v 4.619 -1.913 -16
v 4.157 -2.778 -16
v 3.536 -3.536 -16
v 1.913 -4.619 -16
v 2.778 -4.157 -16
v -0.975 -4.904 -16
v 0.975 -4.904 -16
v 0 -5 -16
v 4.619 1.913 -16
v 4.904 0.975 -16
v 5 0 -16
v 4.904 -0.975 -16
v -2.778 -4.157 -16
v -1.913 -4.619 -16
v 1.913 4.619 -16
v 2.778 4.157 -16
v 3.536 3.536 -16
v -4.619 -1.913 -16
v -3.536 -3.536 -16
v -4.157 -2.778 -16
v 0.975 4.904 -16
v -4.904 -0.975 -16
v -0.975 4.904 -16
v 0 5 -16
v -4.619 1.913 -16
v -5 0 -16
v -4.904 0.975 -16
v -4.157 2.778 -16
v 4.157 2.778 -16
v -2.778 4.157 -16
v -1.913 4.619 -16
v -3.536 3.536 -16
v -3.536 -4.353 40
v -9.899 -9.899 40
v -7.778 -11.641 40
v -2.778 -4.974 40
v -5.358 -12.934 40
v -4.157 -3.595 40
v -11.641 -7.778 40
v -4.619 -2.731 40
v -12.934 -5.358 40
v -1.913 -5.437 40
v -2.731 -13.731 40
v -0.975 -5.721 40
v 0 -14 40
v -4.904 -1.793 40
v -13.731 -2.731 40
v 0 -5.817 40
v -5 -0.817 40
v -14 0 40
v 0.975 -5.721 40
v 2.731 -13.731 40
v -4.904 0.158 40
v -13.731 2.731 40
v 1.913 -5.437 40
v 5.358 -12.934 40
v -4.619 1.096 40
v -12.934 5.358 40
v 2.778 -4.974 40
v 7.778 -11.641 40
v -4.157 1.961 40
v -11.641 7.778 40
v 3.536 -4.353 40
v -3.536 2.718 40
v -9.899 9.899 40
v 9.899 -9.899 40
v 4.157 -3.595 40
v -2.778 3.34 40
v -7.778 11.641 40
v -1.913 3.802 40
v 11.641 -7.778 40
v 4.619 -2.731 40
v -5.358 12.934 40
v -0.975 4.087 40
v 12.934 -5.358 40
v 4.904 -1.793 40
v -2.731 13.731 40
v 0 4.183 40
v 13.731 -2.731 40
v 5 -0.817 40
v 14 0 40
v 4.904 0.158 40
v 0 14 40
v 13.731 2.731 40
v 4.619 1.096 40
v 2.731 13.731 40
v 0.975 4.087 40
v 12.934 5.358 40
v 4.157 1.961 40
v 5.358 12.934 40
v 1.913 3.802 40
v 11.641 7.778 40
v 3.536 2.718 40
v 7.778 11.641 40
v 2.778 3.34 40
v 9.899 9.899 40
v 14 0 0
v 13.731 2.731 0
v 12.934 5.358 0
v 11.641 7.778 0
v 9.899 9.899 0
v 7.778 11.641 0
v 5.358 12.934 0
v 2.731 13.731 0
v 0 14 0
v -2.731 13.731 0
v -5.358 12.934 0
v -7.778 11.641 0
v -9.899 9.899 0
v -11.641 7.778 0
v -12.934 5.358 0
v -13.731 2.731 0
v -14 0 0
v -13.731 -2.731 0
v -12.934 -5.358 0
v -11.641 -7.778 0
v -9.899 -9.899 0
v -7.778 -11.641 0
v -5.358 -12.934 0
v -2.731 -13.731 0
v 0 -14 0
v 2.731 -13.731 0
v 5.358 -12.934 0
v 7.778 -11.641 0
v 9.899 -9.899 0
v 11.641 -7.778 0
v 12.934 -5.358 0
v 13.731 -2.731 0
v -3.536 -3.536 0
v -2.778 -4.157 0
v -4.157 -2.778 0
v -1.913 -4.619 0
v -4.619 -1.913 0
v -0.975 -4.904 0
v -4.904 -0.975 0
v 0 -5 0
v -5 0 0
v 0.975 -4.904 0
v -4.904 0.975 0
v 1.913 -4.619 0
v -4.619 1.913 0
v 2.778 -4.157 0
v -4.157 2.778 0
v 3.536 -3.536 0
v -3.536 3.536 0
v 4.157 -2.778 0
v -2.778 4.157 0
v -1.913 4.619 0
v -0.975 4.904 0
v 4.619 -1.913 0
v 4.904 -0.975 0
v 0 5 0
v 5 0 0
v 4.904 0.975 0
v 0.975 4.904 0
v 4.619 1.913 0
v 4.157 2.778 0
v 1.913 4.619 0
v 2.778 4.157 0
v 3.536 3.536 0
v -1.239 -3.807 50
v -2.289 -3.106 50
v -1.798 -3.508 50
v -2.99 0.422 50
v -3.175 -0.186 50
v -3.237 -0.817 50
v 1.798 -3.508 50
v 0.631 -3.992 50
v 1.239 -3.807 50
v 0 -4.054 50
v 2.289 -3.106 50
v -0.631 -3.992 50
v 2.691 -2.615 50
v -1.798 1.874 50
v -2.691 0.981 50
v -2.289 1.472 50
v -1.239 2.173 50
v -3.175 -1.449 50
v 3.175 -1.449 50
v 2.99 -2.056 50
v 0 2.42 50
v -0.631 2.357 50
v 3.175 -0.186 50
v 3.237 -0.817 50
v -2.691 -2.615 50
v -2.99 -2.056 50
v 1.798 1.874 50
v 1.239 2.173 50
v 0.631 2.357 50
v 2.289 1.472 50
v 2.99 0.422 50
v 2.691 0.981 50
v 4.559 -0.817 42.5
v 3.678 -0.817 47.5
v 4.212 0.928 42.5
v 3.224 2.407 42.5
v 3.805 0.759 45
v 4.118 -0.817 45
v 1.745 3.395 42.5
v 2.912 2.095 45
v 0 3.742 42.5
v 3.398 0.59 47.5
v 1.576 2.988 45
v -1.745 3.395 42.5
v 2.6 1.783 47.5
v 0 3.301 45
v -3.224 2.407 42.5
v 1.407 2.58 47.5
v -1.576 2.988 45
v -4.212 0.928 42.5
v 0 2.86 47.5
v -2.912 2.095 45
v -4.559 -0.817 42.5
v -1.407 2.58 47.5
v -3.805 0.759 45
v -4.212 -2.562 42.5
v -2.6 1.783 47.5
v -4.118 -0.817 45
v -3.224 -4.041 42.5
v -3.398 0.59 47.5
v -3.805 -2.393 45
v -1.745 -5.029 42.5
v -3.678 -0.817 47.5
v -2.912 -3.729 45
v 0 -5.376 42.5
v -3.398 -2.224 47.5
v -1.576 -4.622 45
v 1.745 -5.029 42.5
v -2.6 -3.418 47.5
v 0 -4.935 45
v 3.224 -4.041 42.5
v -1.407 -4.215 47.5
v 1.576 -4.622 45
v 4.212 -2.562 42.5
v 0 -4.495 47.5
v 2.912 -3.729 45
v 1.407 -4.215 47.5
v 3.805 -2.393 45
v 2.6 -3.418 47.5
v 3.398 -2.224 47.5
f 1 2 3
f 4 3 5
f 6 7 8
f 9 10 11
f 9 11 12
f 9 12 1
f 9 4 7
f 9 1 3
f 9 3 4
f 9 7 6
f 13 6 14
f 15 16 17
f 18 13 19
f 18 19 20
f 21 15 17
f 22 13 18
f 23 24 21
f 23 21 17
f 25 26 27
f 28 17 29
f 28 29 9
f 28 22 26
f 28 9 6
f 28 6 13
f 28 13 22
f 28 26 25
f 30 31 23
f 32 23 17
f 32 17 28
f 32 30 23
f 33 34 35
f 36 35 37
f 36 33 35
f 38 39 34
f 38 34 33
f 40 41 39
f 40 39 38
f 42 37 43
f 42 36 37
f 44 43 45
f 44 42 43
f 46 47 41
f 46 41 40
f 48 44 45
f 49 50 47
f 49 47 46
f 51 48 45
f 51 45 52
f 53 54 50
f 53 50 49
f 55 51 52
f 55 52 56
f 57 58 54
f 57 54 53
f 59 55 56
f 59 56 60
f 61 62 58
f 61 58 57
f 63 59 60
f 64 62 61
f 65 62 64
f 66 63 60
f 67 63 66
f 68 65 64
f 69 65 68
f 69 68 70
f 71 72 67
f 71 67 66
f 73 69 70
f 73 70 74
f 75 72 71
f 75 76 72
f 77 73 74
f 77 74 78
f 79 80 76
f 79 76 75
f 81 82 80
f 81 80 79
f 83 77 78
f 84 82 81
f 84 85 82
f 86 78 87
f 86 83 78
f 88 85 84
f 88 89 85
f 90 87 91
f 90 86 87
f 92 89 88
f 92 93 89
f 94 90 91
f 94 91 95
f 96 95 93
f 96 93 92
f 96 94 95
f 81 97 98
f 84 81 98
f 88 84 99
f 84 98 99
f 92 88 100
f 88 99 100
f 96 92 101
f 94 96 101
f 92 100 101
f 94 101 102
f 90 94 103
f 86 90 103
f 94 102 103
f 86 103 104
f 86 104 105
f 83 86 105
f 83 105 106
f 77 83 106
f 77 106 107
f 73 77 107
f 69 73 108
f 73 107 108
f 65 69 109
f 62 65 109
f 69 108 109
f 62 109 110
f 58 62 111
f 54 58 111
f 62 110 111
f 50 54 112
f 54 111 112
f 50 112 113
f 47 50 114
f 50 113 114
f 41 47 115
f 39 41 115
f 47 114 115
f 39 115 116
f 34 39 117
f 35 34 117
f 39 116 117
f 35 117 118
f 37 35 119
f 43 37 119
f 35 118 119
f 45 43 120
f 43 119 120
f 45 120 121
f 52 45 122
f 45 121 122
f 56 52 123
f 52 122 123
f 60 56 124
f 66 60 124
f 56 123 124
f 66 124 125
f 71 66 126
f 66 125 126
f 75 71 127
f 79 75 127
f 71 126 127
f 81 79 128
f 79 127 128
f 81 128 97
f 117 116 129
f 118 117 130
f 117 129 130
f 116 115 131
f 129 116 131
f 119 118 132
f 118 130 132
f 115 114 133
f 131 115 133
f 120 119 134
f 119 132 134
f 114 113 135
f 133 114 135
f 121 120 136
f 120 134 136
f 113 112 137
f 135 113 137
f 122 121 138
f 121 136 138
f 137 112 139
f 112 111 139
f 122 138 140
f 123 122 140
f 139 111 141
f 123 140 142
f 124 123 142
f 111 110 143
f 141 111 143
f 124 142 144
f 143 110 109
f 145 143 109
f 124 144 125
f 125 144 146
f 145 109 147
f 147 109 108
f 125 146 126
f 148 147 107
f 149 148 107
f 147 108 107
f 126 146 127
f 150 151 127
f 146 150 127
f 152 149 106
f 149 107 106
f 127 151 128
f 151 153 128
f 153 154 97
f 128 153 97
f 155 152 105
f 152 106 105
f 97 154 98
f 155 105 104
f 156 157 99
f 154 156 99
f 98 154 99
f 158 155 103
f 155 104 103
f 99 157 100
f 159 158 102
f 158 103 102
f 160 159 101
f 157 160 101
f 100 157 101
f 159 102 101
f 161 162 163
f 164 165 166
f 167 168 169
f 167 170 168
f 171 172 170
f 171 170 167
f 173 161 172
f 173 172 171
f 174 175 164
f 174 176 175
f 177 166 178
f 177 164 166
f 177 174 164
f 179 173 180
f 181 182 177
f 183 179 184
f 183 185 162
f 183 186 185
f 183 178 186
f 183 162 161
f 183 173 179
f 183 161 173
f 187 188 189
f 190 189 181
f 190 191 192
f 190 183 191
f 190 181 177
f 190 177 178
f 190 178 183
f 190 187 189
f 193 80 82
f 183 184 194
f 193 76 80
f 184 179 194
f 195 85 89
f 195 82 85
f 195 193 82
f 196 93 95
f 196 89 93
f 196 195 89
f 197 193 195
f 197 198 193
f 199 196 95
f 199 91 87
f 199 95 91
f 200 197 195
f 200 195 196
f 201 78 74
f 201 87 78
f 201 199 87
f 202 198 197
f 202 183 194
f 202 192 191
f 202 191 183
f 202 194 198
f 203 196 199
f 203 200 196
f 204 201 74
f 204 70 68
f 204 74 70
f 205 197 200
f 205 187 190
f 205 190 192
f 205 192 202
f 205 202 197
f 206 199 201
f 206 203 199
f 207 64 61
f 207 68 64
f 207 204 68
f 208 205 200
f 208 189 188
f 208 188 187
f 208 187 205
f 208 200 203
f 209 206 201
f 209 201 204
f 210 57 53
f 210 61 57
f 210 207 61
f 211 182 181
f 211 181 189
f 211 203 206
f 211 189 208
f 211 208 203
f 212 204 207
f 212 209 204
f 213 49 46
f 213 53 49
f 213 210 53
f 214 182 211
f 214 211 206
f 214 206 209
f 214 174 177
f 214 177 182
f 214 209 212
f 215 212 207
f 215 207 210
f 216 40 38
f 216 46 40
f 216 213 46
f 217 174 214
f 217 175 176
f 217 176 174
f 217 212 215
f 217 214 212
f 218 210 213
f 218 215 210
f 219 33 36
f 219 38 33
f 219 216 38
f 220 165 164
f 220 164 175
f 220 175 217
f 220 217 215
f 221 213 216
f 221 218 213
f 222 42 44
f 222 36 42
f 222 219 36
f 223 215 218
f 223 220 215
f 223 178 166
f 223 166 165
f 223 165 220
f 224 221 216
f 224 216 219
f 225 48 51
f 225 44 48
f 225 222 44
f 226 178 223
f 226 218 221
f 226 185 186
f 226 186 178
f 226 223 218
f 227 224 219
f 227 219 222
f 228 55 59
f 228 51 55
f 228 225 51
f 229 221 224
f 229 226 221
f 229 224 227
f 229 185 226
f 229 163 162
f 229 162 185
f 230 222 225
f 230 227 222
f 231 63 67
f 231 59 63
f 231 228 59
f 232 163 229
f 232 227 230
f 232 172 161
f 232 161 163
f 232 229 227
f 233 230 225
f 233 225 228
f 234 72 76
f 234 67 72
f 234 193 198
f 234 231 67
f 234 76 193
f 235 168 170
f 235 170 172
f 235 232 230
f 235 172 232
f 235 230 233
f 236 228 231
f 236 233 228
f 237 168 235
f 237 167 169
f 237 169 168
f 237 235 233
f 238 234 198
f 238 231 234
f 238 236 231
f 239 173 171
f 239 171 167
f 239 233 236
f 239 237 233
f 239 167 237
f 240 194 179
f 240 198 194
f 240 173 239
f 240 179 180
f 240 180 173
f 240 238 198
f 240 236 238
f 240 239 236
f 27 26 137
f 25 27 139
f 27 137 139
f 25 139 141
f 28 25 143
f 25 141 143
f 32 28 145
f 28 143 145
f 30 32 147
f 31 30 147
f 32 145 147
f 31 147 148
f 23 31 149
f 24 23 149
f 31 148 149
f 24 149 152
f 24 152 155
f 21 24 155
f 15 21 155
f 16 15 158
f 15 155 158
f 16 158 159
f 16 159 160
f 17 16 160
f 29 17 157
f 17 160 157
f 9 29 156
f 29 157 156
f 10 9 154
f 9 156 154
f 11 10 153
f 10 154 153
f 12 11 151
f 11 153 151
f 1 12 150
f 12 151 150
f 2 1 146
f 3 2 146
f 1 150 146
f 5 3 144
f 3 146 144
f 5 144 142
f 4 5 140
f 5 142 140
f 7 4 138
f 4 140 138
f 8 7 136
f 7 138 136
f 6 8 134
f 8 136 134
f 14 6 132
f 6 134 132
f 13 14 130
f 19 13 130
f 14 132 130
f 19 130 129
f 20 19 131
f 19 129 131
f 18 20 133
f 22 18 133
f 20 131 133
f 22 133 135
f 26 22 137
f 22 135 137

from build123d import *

# Parameters (mm, degrees)
SKIZZE1_R                       = 14
AUFSATZ_LINEAR_AUSTRAGEN1_DEPTH = 40
SKIZZE2_R                       = 5
AUFSATZ_LINEAR_AUSTRAGEN2_DEPTH = 16
SKIZZE3_R                       = 5
AUFSATZ_LINEAR_AUSTRAGEN3_DEPTH = 10
AUFSATZ_LINEAR_AUSTRAGEN3_TAPER = 10


with BuildPart() as part:
    # Skizze1 → Aufsatz-Linear austragen1 (new body)
    with BuildSketch(Plane.XY):
        Circle(SKIZZE1_R)
    extrude(amount=AUFSATZ_LINEAR_AUSTRAGEN1_DEPTH)

    # Skizze2 → Aufsatz-Linear austragen2 (add)
    with BuildSketch(Plane(origin=(0, 0, 0), x_dir=(-1, 0, 0), z_dir=(0, 0, -1))):
        Circle(SKIZZE2_R)
    extrude(amount=AUFSATZ_LINEAR_AUSTRAGEN2_DEPTH)

    # Skizze3 → Aufsatz-Linear austragen3 (add)
    with BuildSketch(Plane.XY.offset(40)):
        with Locations((0, -0.81713022)):
            Circle(SKIZZE3_R)
    extrude(amount=AUFSATZ_LINEAR_AUSTRAGEN3_DEPTH, taper=AUFSATZ_LINEAR_AUSTRAGEN3_TAPER)


solid = part.part
